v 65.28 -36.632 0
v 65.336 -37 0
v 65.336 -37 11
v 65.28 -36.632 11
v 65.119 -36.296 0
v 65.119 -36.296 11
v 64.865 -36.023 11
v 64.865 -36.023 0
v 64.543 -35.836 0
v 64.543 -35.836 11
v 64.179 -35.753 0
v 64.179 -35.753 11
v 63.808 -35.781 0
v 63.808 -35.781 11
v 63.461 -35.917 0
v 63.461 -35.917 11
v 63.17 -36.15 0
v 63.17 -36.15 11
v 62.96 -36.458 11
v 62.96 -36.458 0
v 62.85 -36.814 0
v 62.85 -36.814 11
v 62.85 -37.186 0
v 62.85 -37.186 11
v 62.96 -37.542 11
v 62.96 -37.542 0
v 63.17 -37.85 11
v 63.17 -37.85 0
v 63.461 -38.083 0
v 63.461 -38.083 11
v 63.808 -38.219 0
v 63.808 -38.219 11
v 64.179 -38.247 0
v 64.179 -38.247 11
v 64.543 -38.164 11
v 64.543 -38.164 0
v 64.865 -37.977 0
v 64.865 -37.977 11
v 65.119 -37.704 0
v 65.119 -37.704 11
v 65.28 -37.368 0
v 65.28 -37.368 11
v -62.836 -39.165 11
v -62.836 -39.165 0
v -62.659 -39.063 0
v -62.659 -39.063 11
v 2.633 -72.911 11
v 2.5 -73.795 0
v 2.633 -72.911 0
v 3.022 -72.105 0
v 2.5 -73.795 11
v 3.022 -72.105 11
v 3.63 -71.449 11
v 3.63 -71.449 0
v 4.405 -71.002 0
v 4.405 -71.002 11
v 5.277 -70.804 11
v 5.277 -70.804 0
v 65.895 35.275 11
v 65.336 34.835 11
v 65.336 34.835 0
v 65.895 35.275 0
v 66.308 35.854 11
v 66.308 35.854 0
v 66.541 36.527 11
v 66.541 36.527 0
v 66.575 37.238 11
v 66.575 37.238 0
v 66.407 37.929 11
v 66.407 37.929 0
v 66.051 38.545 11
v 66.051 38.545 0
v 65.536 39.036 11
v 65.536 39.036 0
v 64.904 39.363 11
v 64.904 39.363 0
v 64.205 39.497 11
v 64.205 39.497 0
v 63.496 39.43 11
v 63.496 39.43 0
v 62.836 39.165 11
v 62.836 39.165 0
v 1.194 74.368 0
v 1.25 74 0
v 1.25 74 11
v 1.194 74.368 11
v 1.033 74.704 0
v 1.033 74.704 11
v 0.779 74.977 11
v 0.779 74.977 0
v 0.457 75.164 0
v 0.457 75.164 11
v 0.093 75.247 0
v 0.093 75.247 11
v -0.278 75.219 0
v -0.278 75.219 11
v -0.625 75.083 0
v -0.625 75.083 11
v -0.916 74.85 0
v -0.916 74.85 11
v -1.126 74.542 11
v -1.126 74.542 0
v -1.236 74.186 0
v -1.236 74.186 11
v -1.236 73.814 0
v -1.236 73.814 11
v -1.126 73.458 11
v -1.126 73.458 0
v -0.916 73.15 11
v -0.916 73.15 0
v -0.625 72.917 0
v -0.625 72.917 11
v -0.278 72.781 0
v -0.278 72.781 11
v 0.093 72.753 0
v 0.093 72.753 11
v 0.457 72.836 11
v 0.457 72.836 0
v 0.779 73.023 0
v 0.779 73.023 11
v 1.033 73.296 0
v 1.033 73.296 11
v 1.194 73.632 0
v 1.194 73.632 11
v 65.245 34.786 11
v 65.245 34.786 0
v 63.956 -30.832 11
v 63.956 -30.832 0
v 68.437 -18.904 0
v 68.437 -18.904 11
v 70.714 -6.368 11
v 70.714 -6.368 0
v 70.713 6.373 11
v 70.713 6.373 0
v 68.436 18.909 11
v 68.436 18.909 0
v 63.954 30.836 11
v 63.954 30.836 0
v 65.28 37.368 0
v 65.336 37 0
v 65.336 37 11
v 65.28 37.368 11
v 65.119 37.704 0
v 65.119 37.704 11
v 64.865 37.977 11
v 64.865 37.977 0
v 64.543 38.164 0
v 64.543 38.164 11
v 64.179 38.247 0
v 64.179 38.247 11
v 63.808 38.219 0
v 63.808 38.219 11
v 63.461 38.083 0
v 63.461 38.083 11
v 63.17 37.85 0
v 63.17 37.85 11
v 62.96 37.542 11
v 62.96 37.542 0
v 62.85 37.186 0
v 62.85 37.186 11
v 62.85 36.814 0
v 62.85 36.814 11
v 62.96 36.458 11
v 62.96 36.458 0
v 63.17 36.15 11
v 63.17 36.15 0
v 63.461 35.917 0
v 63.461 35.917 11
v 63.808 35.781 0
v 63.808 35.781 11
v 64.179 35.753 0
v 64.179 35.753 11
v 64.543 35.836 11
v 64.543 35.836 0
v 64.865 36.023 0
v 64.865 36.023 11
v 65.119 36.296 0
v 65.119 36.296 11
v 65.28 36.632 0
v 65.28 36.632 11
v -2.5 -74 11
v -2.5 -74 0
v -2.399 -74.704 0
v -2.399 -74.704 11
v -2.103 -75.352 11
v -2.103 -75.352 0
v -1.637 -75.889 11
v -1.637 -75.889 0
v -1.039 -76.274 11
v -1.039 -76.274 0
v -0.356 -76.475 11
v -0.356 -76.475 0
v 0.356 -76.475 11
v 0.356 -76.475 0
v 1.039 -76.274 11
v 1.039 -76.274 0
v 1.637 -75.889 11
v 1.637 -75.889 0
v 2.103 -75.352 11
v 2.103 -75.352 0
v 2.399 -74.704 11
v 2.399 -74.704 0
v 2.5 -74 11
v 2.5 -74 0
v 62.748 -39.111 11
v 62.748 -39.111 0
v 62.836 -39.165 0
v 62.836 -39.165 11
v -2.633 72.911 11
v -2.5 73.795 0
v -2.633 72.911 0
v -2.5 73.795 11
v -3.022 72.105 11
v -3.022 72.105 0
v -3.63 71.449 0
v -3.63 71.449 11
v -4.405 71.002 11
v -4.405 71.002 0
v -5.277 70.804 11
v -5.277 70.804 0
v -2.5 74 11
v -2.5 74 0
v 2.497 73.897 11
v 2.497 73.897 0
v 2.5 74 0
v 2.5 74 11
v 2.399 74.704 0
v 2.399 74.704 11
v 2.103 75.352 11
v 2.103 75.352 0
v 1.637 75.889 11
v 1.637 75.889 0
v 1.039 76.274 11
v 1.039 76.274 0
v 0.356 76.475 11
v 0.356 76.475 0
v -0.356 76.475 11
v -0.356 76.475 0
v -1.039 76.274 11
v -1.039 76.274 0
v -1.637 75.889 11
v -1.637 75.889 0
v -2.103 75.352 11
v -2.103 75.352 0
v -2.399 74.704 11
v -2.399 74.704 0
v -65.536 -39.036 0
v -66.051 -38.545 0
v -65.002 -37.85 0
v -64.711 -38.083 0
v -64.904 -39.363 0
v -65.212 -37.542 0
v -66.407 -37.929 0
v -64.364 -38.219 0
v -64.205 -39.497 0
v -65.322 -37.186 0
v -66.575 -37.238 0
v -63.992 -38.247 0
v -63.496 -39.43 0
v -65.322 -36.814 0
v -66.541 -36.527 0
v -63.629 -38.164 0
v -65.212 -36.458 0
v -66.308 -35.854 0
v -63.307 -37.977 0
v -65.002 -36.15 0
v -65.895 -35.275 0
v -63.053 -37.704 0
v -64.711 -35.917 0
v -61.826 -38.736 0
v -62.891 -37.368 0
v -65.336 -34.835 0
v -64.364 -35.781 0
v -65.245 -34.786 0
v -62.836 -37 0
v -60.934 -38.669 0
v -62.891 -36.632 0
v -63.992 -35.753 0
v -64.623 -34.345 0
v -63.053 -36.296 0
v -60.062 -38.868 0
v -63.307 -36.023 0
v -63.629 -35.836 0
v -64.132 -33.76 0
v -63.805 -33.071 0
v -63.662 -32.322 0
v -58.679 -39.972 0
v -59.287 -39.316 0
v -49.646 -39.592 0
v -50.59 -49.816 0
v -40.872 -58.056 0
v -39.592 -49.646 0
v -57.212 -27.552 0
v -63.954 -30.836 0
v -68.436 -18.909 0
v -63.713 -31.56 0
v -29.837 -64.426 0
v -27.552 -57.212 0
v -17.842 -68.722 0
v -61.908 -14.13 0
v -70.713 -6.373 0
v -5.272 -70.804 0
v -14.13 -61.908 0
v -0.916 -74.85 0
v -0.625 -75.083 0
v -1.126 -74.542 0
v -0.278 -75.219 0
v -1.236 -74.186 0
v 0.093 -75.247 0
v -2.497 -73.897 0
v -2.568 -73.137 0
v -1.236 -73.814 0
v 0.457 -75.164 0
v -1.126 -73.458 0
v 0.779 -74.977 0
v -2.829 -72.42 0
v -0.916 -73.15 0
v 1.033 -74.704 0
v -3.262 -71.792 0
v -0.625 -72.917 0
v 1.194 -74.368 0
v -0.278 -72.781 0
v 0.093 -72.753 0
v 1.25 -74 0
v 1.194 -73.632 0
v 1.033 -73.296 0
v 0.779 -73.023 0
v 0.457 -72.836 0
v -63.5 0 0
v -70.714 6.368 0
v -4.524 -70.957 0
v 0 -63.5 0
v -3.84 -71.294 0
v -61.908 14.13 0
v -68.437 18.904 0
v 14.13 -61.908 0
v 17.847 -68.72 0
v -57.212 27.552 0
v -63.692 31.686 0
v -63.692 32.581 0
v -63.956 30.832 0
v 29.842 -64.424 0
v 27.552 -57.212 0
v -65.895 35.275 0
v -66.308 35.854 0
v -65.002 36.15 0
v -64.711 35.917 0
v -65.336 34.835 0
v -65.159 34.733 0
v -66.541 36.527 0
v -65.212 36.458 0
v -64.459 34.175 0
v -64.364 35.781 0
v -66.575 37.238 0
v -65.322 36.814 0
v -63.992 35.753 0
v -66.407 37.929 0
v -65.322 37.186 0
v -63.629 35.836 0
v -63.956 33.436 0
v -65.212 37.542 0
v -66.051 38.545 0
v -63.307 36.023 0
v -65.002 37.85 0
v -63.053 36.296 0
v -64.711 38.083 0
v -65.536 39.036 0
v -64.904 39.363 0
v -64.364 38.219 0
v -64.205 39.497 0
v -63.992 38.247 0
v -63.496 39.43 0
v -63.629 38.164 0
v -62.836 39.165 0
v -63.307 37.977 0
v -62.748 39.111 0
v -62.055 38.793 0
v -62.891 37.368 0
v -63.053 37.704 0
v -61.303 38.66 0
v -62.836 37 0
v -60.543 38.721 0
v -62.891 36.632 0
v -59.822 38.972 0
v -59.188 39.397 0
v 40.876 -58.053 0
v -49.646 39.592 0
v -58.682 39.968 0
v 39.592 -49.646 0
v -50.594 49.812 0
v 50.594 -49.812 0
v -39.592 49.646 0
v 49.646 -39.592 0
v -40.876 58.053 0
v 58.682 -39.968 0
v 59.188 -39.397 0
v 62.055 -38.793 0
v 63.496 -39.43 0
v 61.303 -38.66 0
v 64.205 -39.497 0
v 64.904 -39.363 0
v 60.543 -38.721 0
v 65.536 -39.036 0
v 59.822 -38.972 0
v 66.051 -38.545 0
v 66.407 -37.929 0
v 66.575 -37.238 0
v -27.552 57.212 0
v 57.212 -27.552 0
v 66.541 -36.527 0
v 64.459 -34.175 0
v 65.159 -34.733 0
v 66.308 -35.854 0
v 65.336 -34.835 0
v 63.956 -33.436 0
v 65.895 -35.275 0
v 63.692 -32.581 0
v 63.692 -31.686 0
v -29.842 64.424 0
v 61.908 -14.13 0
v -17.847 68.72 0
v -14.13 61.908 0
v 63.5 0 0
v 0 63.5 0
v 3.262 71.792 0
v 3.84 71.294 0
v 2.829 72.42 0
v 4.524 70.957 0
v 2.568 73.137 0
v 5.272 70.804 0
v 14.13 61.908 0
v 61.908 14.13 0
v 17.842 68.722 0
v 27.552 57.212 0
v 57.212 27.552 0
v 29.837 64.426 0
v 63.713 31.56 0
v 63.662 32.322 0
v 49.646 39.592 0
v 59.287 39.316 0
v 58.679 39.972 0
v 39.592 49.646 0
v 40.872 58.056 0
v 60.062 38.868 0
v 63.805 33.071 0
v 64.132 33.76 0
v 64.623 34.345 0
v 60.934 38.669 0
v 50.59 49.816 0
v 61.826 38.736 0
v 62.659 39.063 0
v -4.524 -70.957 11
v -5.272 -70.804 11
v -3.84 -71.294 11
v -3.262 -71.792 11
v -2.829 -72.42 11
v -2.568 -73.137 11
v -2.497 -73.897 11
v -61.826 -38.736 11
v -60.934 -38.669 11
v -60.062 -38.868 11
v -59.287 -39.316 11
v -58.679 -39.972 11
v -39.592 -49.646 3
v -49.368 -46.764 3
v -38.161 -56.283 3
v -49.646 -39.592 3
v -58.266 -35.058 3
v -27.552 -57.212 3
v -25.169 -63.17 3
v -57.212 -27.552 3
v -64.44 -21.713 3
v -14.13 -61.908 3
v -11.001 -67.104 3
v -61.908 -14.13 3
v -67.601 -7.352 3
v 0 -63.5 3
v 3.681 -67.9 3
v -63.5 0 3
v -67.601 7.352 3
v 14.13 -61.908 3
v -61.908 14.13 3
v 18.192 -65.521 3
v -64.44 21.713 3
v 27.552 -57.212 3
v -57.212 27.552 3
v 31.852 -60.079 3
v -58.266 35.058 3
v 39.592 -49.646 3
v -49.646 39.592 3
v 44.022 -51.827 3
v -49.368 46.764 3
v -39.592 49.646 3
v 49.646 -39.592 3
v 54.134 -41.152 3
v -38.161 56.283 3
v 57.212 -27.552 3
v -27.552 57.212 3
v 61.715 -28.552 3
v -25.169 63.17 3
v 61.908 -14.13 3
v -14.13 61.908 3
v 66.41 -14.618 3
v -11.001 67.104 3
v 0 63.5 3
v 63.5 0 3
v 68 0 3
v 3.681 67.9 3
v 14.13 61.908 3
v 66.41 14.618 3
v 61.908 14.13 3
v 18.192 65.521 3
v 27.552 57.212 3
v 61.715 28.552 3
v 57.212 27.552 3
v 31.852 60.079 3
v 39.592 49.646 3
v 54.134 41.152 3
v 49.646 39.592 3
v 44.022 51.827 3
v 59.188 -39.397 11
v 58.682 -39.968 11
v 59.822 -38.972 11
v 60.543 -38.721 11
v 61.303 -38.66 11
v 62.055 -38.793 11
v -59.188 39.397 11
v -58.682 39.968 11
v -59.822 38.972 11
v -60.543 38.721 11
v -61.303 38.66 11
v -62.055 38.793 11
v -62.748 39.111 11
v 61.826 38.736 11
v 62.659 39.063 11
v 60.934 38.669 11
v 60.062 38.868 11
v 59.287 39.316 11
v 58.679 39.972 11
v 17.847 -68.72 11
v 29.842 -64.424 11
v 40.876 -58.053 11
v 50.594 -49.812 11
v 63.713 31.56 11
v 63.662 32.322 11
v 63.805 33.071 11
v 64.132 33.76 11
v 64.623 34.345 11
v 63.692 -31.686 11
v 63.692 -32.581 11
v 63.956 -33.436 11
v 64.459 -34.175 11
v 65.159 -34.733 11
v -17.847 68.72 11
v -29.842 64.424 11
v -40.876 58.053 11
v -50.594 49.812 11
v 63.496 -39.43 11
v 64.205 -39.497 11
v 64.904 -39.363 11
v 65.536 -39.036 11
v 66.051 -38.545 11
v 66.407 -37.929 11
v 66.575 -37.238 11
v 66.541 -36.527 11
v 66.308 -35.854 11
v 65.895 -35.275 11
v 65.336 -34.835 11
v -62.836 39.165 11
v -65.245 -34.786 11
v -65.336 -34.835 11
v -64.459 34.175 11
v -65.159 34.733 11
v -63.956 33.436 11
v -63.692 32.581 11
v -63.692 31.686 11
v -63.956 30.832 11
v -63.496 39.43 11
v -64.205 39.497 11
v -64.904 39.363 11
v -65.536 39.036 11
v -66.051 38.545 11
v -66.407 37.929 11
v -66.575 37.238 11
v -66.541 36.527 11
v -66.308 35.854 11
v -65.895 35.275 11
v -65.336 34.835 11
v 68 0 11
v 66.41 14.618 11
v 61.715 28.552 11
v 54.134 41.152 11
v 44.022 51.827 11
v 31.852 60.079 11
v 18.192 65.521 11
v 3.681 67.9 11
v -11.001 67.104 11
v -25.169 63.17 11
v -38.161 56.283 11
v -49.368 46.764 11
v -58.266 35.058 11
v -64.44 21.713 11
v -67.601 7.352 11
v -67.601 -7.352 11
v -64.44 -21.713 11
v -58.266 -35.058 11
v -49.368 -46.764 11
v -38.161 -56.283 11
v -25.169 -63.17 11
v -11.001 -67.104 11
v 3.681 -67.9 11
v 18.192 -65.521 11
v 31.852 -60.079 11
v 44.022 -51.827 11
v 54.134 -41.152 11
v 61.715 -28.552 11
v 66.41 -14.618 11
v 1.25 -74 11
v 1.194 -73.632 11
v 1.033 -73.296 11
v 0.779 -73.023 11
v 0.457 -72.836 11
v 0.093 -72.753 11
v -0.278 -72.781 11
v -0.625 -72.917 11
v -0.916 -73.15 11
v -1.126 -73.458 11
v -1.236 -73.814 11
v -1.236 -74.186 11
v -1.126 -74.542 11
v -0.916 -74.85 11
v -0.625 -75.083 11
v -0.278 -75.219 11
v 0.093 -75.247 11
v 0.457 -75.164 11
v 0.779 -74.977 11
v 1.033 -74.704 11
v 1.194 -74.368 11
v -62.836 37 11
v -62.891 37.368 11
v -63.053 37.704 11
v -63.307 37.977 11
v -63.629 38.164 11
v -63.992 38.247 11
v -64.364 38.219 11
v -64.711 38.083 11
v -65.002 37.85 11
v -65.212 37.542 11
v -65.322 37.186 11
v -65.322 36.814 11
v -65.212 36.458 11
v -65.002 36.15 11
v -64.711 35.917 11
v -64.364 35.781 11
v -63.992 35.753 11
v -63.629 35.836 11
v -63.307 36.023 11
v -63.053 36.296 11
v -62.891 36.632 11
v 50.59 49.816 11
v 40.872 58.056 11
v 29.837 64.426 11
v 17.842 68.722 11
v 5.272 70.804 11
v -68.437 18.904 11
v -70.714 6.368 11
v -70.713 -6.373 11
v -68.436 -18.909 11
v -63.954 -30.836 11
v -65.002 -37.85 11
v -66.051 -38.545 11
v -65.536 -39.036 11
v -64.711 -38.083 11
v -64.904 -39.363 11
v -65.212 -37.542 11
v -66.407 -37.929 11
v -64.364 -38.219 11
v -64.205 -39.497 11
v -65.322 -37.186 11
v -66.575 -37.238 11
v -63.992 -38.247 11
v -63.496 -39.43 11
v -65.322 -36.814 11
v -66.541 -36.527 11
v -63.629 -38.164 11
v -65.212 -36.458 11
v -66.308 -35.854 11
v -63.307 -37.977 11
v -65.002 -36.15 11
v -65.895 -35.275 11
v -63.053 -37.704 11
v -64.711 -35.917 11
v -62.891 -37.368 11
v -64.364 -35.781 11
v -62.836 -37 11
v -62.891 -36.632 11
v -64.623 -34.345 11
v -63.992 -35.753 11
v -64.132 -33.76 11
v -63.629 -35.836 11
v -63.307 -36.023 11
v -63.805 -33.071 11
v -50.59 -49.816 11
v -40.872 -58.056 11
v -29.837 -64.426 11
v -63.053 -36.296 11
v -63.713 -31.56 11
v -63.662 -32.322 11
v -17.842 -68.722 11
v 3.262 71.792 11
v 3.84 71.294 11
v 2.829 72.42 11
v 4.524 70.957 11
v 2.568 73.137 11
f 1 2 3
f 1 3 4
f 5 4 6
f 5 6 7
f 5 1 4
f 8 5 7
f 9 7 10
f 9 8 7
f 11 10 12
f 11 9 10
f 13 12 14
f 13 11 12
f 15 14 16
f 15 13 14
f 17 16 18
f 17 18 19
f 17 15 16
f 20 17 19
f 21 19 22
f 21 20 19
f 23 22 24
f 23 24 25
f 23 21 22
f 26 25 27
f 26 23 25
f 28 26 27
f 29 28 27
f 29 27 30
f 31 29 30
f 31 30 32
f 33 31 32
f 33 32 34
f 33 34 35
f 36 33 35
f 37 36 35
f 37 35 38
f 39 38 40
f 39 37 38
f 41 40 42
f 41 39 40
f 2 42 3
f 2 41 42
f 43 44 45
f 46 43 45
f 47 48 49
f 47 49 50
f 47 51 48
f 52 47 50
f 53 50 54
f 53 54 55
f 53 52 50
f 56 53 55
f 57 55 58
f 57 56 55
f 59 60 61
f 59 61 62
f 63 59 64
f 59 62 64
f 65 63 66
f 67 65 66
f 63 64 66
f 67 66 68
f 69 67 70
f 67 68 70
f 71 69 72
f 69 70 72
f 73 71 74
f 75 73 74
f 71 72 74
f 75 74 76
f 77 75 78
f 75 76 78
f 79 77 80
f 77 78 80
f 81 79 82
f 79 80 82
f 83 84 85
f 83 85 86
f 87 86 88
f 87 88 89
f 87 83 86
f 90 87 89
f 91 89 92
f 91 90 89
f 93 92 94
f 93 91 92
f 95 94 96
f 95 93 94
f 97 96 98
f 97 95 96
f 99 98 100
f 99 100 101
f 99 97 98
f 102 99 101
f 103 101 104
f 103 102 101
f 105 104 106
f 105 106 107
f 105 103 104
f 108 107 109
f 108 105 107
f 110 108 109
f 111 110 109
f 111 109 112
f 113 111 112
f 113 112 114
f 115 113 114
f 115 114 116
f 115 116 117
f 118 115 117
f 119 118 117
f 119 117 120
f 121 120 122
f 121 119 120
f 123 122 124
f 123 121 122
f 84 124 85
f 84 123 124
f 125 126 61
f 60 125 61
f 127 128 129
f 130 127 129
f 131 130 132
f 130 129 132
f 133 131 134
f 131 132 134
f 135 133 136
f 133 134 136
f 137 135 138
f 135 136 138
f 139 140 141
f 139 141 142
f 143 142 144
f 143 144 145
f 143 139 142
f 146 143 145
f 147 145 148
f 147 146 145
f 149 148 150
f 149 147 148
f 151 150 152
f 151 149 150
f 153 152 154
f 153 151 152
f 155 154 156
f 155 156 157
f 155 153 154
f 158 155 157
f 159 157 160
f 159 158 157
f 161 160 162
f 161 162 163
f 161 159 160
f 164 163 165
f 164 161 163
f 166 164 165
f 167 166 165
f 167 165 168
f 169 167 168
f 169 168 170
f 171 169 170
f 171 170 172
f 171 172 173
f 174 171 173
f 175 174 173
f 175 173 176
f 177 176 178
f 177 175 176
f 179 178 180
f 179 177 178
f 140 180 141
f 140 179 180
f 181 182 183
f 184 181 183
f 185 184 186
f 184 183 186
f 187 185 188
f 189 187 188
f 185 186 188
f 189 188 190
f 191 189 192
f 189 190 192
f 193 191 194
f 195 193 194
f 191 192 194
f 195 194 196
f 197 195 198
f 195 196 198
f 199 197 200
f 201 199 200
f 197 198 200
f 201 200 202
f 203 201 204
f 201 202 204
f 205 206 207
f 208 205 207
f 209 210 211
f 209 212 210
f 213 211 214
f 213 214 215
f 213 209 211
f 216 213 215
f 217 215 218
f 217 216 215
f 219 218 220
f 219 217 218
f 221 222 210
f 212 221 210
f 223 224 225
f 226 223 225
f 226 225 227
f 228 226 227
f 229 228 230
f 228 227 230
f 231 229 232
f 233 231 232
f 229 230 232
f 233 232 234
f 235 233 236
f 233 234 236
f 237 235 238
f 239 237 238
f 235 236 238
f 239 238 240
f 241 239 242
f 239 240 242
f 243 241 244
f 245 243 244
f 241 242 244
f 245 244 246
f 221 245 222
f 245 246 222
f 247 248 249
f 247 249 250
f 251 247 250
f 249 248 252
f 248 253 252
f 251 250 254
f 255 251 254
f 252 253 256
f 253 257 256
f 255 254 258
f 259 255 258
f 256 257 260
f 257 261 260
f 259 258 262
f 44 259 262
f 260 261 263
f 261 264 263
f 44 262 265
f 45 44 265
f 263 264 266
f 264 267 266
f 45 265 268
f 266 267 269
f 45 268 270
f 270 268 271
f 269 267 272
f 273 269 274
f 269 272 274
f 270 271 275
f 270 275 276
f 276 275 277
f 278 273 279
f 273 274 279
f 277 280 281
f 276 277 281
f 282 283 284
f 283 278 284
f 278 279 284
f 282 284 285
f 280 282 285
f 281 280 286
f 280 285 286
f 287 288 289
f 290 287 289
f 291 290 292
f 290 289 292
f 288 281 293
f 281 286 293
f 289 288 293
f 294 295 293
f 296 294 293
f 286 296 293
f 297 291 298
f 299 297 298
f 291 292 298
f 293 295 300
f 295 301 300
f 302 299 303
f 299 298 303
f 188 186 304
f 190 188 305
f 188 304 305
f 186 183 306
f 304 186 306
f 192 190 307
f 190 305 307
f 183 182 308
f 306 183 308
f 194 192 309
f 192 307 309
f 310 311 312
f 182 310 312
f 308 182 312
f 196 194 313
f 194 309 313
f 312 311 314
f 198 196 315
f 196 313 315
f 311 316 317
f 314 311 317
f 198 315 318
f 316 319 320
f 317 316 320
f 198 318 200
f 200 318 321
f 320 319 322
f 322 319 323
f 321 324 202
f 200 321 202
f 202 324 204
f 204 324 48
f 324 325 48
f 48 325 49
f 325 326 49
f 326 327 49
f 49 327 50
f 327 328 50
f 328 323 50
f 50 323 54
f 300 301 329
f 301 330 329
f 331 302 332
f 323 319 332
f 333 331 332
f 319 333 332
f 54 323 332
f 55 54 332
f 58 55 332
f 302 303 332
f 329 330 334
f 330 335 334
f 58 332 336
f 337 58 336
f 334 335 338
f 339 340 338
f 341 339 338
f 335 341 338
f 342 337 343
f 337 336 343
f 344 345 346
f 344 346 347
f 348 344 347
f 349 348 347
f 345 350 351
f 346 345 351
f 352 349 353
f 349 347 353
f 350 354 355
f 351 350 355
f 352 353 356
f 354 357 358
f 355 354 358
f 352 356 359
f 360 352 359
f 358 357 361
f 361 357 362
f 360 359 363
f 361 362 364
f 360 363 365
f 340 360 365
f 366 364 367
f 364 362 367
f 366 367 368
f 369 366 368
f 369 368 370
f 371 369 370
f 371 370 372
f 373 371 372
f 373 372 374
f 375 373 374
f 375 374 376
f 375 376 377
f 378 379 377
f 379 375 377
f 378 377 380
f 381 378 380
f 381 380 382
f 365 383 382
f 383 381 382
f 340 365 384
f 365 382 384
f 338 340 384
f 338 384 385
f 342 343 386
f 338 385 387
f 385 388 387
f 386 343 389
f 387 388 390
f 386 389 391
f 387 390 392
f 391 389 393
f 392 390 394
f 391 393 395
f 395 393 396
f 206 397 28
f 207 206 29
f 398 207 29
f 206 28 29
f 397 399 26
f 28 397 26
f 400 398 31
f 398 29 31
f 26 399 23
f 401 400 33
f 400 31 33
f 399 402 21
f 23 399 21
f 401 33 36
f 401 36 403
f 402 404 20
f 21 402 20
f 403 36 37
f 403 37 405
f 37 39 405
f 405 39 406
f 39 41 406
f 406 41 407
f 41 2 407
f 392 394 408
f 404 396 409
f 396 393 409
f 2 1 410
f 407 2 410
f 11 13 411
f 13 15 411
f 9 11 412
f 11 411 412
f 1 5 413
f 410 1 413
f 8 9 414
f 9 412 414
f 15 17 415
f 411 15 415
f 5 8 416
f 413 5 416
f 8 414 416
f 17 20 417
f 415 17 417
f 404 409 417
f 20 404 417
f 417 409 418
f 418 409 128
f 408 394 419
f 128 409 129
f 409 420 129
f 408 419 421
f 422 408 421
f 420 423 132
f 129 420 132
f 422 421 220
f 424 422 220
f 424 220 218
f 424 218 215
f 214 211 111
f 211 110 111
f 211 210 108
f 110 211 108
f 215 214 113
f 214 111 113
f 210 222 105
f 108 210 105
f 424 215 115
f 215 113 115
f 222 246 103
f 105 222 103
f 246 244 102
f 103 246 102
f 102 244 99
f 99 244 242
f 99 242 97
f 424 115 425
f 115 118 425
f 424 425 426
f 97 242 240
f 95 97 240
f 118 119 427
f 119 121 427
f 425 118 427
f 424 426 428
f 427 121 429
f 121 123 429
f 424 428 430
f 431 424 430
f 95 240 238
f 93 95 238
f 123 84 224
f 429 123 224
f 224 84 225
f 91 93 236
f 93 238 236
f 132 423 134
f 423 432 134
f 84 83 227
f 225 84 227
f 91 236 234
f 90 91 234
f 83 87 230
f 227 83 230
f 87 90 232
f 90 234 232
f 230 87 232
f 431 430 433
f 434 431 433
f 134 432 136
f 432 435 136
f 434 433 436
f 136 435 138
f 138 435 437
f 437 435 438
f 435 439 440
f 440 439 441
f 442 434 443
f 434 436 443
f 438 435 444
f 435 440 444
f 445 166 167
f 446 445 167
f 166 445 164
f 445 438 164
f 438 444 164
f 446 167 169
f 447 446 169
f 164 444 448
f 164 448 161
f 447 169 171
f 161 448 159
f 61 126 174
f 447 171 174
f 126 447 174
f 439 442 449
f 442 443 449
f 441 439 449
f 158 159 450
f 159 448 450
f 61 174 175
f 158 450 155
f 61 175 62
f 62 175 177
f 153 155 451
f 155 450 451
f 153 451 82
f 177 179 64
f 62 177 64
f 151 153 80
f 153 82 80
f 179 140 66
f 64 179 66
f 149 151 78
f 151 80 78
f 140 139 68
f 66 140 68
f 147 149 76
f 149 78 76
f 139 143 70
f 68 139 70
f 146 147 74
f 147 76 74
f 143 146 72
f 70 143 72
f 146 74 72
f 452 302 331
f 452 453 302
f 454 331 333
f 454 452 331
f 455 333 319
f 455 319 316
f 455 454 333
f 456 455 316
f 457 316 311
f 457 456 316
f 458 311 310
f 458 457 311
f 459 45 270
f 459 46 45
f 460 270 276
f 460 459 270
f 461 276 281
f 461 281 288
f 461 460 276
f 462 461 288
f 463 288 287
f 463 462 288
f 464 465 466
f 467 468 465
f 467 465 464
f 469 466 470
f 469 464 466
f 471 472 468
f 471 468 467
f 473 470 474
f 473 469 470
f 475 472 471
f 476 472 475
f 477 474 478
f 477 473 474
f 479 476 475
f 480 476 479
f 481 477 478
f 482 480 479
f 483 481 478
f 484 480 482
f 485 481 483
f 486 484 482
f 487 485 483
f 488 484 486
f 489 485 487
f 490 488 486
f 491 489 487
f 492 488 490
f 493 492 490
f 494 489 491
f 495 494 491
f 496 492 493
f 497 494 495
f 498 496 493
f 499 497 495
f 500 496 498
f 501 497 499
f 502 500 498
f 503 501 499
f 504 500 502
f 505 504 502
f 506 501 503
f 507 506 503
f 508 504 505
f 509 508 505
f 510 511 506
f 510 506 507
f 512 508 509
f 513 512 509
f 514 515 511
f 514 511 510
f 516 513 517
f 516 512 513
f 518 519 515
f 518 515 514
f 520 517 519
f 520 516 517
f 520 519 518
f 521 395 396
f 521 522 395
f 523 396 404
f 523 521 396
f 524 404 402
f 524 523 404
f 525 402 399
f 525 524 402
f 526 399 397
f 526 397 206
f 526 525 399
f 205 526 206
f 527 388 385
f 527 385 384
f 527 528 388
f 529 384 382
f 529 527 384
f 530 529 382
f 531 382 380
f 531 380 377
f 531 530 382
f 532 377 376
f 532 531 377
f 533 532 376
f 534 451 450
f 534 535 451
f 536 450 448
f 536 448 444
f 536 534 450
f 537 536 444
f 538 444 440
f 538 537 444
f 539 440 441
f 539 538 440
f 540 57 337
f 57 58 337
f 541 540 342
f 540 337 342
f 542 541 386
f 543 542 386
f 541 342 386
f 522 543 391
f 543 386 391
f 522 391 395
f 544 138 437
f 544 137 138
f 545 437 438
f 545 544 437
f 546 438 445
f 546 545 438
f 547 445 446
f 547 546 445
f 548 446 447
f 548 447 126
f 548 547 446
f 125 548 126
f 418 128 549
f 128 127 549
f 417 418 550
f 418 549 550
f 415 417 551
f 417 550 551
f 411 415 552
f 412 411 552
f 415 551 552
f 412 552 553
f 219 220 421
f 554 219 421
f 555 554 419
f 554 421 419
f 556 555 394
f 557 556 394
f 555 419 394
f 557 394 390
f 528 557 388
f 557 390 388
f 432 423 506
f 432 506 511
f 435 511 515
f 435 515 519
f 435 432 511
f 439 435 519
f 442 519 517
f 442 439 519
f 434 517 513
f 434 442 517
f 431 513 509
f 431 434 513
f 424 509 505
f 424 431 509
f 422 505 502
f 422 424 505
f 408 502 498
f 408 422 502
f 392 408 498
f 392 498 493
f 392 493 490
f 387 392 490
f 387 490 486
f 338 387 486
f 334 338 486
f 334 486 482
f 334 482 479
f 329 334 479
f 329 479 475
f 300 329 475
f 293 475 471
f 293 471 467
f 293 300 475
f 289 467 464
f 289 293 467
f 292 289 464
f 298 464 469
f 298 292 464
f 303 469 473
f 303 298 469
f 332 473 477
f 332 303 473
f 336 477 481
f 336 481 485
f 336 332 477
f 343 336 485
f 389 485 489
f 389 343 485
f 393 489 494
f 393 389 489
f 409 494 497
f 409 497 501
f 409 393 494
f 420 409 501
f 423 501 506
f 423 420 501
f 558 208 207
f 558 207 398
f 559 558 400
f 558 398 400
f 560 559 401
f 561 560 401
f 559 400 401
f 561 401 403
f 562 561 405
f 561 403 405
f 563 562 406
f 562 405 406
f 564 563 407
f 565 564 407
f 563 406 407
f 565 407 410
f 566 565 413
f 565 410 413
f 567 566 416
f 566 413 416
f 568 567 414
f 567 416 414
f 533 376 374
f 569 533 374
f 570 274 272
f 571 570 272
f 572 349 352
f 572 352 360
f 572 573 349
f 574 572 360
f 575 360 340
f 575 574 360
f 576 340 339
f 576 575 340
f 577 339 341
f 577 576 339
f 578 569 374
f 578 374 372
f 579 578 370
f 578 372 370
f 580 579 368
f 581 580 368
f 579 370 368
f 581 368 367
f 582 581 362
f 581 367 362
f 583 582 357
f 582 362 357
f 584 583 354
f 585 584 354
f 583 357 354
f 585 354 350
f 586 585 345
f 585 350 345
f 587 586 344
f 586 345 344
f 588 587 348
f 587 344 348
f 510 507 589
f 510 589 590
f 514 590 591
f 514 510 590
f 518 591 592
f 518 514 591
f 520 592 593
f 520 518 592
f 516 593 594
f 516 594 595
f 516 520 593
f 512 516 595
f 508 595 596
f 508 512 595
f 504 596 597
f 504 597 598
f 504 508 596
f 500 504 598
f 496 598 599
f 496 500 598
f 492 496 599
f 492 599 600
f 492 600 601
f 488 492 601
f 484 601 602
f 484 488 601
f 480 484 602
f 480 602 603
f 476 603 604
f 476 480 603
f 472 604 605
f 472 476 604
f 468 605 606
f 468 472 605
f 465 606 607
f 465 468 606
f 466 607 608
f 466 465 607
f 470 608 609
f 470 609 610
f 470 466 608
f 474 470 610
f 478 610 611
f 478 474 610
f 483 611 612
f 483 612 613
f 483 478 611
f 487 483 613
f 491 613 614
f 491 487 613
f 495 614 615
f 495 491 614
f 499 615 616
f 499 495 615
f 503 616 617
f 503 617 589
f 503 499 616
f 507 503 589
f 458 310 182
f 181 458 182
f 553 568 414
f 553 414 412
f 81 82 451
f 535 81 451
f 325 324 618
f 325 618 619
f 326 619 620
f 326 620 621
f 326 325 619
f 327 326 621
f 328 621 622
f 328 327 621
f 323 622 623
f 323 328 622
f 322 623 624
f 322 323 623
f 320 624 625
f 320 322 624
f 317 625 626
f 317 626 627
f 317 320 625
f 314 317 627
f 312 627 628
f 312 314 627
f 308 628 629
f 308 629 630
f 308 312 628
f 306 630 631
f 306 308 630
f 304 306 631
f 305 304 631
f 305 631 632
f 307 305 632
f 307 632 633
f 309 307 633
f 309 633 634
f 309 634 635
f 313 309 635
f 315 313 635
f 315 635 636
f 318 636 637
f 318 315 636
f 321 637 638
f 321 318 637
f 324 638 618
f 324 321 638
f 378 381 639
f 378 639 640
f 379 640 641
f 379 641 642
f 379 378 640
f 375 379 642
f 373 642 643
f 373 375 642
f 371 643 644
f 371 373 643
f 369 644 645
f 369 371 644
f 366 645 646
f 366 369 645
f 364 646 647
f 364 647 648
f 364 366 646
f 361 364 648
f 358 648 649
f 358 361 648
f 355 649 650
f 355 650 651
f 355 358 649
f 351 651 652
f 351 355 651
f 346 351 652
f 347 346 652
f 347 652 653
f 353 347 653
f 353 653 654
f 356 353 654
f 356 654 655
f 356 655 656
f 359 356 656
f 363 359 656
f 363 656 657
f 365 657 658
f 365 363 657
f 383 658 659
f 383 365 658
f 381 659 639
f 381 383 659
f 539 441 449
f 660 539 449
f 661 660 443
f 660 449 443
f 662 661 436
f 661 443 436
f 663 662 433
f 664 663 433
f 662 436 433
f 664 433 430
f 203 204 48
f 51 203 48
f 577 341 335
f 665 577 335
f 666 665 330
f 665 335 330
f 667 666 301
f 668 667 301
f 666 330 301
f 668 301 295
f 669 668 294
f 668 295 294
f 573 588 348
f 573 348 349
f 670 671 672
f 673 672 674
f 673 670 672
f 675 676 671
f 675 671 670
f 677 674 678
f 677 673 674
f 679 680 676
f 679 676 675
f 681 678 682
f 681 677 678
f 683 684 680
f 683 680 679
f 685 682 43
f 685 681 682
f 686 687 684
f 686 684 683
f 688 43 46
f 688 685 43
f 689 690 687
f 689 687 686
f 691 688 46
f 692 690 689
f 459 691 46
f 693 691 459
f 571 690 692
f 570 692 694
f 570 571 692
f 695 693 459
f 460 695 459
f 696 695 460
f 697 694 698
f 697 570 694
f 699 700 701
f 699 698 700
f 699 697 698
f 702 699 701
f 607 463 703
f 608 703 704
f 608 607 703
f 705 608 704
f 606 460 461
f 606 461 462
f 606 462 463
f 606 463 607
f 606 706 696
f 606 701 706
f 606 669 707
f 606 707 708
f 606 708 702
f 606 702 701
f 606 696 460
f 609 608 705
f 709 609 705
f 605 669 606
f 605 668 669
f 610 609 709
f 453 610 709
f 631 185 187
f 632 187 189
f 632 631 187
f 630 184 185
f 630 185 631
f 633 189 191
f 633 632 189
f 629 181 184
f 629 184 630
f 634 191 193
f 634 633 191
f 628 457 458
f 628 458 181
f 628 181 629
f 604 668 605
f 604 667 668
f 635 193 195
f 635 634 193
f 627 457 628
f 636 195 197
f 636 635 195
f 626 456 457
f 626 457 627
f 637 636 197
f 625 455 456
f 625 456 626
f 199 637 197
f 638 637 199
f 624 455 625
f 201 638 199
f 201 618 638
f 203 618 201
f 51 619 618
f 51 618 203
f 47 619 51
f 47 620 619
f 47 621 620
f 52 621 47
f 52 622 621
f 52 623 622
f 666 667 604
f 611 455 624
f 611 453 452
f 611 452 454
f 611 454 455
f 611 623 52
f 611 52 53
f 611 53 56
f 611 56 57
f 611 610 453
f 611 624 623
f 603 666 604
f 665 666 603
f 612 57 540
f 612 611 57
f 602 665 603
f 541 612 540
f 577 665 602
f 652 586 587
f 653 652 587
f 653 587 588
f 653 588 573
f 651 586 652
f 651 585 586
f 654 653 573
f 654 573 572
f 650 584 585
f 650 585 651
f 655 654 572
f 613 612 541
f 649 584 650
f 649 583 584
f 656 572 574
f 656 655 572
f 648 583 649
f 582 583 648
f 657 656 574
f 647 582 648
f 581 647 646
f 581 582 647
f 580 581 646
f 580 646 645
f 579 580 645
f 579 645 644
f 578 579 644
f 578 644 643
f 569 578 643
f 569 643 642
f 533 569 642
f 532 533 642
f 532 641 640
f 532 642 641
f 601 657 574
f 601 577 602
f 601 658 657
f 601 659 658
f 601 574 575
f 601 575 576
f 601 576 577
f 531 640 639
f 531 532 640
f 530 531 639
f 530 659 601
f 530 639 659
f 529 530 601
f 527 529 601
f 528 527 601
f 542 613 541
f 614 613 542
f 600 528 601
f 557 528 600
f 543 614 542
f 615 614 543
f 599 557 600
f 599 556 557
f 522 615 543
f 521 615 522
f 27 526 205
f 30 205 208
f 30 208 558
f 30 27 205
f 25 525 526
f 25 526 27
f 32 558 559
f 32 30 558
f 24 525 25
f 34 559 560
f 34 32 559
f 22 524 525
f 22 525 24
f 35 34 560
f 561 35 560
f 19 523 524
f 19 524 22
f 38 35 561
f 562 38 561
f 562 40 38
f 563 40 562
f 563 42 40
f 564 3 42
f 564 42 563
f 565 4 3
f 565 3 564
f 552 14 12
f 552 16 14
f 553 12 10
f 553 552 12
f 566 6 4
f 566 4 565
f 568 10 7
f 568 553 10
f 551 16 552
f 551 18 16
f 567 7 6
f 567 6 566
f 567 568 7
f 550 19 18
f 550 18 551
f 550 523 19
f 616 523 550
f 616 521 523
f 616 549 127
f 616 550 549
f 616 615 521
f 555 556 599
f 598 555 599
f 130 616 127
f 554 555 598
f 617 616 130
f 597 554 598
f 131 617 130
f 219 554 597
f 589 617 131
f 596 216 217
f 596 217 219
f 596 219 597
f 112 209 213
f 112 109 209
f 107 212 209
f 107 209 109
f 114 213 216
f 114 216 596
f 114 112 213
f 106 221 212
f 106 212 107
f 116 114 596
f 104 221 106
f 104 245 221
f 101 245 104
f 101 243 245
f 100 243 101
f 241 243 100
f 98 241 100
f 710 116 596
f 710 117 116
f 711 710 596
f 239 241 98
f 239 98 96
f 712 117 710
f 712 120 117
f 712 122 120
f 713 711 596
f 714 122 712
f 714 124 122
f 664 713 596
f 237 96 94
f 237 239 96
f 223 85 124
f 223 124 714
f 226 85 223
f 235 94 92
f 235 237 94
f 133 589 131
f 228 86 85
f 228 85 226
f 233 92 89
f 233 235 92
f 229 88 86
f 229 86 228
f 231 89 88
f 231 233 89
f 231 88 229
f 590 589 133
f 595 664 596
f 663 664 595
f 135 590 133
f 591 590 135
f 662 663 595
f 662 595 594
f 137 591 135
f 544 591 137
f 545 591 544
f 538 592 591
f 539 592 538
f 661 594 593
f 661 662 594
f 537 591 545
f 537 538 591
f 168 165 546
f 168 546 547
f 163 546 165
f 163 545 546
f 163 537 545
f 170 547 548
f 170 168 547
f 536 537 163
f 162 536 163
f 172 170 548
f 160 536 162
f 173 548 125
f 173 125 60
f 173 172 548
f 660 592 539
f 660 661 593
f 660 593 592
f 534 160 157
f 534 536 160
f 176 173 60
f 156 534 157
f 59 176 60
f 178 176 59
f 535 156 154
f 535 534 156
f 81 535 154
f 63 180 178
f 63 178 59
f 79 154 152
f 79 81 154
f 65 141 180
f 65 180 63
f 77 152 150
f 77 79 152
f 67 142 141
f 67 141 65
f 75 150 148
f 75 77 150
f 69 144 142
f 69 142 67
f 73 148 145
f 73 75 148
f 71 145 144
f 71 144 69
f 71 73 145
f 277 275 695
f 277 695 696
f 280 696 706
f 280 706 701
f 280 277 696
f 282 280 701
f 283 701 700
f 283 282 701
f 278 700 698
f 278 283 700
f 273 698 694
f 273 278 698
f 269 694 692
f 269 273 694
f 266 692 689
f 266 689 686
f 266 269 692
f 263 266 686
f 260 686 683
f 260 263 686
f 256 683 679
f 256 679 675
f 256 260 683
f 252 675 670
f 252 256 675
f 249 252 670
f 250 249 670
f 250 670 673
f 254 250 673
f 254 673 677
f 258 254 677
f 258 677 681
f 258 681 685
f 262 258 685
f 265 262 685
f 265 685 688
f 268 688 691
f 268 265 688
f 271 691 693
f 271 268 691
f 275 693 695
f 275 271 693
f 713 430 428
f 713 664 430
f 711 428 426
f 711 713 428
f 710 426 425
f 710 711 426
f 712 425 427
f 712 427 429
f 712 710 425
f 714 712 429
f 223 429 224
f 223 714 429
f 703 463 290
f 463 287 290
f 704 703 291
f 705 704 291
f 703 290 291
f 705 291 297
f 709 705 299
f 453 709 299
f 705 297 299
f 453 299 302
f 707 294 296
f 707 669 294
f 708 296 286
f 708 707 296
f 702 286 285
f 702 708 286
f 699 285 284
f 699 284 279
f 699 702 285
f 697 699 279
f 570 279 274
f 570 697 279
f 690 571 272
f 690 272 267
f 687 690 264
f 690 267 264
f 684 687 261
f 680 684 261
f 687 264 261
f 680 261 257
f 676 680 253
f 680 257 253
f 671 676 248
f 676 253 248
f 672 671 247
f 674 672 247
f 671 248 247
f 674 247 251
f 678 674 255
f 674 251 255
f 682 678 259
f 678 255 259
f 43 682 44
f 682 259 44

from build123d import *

# Parameters (mm, degrees)
SKETCH_1_R      = 71
SKETCH_1_R_2    = 63.5
EXTRUDE_1_DEPTH = 3
SKETCH_2_R      = 71
SKETCH_2_R_2    = 68
EXTRUDE_2_DEPTH = 8
EXTRUDE_START   = -11
SKETCH_3_R      = 1.25
EXTRUDE_3_DEPTH = 11
FILLET_2_R      = 3


with BuildPart() as part:
    # 草图1 → 凸台-拉伸1 (new body)
    with BuildSketch(Plane.XY):
        Circle(SKETCH_1_R)
        Circle(SKETCH_1_R_2, mode=Mode.SUBTRACT)
    extrude(amount=EXTRUDE_1_DEPTH)

    # 草图2 → 凸台-拉伸2 (add)
    with BuildSketch(Plane.XY.offset(3)):
        Circle(SKETCH_2_R)
        Circle(SKETCH_2_R_2, mode=Mode.SUBTRACT)
    extrude(amount=EXTRUDE_2_DEPTH)

    # 草图3 → 凸台-拉伸3 (add)
    # profile 1 of 6: a face of its own
    with BuildSketch(Plane.XY.offset(11).offset(EXTRUDE_START)):
        with BuildLine():
            ThreePointArc((2.5, 74), (0, 76.5), (-2.5, 74))
            Line((-2.5, 74), (-2.5, 70.955972264))
            ThreePointArc((-2.5, 70.955972264), (-0.051390082, 70.999981402), (2.397280978, 70.959516937))
            Line((2.397280978, 70.959516937), (2.5, 74))
        make_face()
        with Locations((0, 74)):
            Circle(SKETCH_3_R, mode=Mode.SUBTRACT)
    # profile 2 of 6: a face of its own
    with BuildSketch(Plane.XY.offset(11).offset(EXTRUDE_START)):
        with BuildLine():
            ThreePointArc((65.33587988, 34.834936491), (66.25094339, 38.25), (62.83587988, 39.165063509))
            Line((62.83587988, 39.165063509), (60.199674531, 37.643049642))
            ThreePointArc((60.199674531, 37.643049642), (61.462092521, 35.544495818), (62.651384796, 33.403652242))
            Line((62.651384796, 33.403652242), (65.33587988, 34.834936491))
        make_face()
        with Locations((64.08587988, 37)):
            Circle(SKETCH_3_R, mode=Mode.SUBTRACT)
    # profile 3 of 6: a face of its own
    with BuildSketch(Plane.XY.offset(11).offset(EXTRUDE_START)):
        with BuildLine():
            ThreePointArc((62.83587988, -39.165063509), (66.25094339, -38.25), (65.33587988, -34.834936491))
            Line((65.33587988, -34.834936491), (62.699674531, -33.312922623))
            ThreePointArc((62.699674531, -33.312922623), (61.513482603, -35.455485584), (60.254103819, -37.555864695))
            Line((60.254103819, -37.555864695), (62.83587988, -39.165063509))
        make_face()
        with Locations((64.08587988, -37)):
            Circle(SKETCH_3_R, mode=Mode.SUBTRACT)
    # profile 4 of 6: a face of its own
    with BuildSketch(Plane.XY.offset(11).offset(EXTRUDE_START)):
        with BuildLine():
            ThreePointArc((-2.5, -74), (0, -76.5), (2.5, -74))
            Line((2.5, -74), (2.5, -70.955972264))
            ThreePointArc((2.5, -70.955972264), (0.051390082, -70.999981402), (-2.397280978, -70.959516937))
            Line((-2.397280978, -70.959516937), (-2.5, -74))
        make_face()
        with Locations((0, -74)):
            Circle(SKETCH_3_R, mode=Mode.SUBTRACT)
    # profile 5 of 6: a face of its own
    with BuildSketch(Plane.XY.offset(11).offset(EXTRUDE_START)):
        with BuildLine():
            ThreePointArc((-65.33587988, -34.834936491), (-66.25094339, -38.25), (-62.83587988, -39.165063509))
            Line((-62.83587988, -39.165063509), (-60.199674531, -37.643049642))
            ThreePointArc((-60.199674531, -37.643049642), (-61.462092521, -35.544495818), (-62.651384796, -33.403652242))
            Line((-62.651384796, -33.403652242), (-65.33587988, -34.834936491))
        make_face()
        with Locations((-64.08587988, -37)):
            Circle(SKETCH_3_R, mode=Mode.SUBTRACT)
    # profile 6 of 6: a face of its own
    with BuildSketch(Plane.XY.offset(11).offset(EXTRUDE_START)):
        with BuildLine():
            ThreePointArc((-62.83587988, 39.165063509), (-66.25094339, 38.25), (-65.33587988, 34.834936491))
            Line((-65.33587988, 34.834936491), (-62.699674531, 33.312922623))
            ThreePointArc((-62.699674531, 33.312922623), (-61.513482603, 35.455485584), (-60.254103819, 37.555864695))
            Line((-60.254103819, 37.555864695), (-62.83587988, 39.165063509))
        make_face()
        with Locations((-64.08587988, 37)):
            Circle(SKETCH_3_R, mode=Mode.SUBTRACT)
    extrude(amount=EXTRUDE_3_DEPTH)

    # 圆角2
    fillet_2_edges = [part.edges().sort_by_distance(p)[0] for p in [
        (60.254103819, -37.555864695, 5.5),
        (62.699674531, -33.312922623, 5.5),
        (-2.397280978, -70.959516937, 5.5),
        (2.5, -70.955972264, 5.5),
        (-62.651384796, -33.403652242, 5.5),
        (-60.199674531, -37.643049642, 5.5),
        (-60.254103819, 37.555864695, 5.5),
        (-62.699674531, 33.312922623, 5.5),
        (2.397280978, 70.959516937, 5.5),
        (-2.5, 70.955972264, 5.5),
        (62.651384796, 33.403652242, 5.5),
        (60.199674531, 37.643049642, 5.5),
    ]]
    fillet(fillet_2_edges, radius=FILLET_2_R)


solid = part.part
